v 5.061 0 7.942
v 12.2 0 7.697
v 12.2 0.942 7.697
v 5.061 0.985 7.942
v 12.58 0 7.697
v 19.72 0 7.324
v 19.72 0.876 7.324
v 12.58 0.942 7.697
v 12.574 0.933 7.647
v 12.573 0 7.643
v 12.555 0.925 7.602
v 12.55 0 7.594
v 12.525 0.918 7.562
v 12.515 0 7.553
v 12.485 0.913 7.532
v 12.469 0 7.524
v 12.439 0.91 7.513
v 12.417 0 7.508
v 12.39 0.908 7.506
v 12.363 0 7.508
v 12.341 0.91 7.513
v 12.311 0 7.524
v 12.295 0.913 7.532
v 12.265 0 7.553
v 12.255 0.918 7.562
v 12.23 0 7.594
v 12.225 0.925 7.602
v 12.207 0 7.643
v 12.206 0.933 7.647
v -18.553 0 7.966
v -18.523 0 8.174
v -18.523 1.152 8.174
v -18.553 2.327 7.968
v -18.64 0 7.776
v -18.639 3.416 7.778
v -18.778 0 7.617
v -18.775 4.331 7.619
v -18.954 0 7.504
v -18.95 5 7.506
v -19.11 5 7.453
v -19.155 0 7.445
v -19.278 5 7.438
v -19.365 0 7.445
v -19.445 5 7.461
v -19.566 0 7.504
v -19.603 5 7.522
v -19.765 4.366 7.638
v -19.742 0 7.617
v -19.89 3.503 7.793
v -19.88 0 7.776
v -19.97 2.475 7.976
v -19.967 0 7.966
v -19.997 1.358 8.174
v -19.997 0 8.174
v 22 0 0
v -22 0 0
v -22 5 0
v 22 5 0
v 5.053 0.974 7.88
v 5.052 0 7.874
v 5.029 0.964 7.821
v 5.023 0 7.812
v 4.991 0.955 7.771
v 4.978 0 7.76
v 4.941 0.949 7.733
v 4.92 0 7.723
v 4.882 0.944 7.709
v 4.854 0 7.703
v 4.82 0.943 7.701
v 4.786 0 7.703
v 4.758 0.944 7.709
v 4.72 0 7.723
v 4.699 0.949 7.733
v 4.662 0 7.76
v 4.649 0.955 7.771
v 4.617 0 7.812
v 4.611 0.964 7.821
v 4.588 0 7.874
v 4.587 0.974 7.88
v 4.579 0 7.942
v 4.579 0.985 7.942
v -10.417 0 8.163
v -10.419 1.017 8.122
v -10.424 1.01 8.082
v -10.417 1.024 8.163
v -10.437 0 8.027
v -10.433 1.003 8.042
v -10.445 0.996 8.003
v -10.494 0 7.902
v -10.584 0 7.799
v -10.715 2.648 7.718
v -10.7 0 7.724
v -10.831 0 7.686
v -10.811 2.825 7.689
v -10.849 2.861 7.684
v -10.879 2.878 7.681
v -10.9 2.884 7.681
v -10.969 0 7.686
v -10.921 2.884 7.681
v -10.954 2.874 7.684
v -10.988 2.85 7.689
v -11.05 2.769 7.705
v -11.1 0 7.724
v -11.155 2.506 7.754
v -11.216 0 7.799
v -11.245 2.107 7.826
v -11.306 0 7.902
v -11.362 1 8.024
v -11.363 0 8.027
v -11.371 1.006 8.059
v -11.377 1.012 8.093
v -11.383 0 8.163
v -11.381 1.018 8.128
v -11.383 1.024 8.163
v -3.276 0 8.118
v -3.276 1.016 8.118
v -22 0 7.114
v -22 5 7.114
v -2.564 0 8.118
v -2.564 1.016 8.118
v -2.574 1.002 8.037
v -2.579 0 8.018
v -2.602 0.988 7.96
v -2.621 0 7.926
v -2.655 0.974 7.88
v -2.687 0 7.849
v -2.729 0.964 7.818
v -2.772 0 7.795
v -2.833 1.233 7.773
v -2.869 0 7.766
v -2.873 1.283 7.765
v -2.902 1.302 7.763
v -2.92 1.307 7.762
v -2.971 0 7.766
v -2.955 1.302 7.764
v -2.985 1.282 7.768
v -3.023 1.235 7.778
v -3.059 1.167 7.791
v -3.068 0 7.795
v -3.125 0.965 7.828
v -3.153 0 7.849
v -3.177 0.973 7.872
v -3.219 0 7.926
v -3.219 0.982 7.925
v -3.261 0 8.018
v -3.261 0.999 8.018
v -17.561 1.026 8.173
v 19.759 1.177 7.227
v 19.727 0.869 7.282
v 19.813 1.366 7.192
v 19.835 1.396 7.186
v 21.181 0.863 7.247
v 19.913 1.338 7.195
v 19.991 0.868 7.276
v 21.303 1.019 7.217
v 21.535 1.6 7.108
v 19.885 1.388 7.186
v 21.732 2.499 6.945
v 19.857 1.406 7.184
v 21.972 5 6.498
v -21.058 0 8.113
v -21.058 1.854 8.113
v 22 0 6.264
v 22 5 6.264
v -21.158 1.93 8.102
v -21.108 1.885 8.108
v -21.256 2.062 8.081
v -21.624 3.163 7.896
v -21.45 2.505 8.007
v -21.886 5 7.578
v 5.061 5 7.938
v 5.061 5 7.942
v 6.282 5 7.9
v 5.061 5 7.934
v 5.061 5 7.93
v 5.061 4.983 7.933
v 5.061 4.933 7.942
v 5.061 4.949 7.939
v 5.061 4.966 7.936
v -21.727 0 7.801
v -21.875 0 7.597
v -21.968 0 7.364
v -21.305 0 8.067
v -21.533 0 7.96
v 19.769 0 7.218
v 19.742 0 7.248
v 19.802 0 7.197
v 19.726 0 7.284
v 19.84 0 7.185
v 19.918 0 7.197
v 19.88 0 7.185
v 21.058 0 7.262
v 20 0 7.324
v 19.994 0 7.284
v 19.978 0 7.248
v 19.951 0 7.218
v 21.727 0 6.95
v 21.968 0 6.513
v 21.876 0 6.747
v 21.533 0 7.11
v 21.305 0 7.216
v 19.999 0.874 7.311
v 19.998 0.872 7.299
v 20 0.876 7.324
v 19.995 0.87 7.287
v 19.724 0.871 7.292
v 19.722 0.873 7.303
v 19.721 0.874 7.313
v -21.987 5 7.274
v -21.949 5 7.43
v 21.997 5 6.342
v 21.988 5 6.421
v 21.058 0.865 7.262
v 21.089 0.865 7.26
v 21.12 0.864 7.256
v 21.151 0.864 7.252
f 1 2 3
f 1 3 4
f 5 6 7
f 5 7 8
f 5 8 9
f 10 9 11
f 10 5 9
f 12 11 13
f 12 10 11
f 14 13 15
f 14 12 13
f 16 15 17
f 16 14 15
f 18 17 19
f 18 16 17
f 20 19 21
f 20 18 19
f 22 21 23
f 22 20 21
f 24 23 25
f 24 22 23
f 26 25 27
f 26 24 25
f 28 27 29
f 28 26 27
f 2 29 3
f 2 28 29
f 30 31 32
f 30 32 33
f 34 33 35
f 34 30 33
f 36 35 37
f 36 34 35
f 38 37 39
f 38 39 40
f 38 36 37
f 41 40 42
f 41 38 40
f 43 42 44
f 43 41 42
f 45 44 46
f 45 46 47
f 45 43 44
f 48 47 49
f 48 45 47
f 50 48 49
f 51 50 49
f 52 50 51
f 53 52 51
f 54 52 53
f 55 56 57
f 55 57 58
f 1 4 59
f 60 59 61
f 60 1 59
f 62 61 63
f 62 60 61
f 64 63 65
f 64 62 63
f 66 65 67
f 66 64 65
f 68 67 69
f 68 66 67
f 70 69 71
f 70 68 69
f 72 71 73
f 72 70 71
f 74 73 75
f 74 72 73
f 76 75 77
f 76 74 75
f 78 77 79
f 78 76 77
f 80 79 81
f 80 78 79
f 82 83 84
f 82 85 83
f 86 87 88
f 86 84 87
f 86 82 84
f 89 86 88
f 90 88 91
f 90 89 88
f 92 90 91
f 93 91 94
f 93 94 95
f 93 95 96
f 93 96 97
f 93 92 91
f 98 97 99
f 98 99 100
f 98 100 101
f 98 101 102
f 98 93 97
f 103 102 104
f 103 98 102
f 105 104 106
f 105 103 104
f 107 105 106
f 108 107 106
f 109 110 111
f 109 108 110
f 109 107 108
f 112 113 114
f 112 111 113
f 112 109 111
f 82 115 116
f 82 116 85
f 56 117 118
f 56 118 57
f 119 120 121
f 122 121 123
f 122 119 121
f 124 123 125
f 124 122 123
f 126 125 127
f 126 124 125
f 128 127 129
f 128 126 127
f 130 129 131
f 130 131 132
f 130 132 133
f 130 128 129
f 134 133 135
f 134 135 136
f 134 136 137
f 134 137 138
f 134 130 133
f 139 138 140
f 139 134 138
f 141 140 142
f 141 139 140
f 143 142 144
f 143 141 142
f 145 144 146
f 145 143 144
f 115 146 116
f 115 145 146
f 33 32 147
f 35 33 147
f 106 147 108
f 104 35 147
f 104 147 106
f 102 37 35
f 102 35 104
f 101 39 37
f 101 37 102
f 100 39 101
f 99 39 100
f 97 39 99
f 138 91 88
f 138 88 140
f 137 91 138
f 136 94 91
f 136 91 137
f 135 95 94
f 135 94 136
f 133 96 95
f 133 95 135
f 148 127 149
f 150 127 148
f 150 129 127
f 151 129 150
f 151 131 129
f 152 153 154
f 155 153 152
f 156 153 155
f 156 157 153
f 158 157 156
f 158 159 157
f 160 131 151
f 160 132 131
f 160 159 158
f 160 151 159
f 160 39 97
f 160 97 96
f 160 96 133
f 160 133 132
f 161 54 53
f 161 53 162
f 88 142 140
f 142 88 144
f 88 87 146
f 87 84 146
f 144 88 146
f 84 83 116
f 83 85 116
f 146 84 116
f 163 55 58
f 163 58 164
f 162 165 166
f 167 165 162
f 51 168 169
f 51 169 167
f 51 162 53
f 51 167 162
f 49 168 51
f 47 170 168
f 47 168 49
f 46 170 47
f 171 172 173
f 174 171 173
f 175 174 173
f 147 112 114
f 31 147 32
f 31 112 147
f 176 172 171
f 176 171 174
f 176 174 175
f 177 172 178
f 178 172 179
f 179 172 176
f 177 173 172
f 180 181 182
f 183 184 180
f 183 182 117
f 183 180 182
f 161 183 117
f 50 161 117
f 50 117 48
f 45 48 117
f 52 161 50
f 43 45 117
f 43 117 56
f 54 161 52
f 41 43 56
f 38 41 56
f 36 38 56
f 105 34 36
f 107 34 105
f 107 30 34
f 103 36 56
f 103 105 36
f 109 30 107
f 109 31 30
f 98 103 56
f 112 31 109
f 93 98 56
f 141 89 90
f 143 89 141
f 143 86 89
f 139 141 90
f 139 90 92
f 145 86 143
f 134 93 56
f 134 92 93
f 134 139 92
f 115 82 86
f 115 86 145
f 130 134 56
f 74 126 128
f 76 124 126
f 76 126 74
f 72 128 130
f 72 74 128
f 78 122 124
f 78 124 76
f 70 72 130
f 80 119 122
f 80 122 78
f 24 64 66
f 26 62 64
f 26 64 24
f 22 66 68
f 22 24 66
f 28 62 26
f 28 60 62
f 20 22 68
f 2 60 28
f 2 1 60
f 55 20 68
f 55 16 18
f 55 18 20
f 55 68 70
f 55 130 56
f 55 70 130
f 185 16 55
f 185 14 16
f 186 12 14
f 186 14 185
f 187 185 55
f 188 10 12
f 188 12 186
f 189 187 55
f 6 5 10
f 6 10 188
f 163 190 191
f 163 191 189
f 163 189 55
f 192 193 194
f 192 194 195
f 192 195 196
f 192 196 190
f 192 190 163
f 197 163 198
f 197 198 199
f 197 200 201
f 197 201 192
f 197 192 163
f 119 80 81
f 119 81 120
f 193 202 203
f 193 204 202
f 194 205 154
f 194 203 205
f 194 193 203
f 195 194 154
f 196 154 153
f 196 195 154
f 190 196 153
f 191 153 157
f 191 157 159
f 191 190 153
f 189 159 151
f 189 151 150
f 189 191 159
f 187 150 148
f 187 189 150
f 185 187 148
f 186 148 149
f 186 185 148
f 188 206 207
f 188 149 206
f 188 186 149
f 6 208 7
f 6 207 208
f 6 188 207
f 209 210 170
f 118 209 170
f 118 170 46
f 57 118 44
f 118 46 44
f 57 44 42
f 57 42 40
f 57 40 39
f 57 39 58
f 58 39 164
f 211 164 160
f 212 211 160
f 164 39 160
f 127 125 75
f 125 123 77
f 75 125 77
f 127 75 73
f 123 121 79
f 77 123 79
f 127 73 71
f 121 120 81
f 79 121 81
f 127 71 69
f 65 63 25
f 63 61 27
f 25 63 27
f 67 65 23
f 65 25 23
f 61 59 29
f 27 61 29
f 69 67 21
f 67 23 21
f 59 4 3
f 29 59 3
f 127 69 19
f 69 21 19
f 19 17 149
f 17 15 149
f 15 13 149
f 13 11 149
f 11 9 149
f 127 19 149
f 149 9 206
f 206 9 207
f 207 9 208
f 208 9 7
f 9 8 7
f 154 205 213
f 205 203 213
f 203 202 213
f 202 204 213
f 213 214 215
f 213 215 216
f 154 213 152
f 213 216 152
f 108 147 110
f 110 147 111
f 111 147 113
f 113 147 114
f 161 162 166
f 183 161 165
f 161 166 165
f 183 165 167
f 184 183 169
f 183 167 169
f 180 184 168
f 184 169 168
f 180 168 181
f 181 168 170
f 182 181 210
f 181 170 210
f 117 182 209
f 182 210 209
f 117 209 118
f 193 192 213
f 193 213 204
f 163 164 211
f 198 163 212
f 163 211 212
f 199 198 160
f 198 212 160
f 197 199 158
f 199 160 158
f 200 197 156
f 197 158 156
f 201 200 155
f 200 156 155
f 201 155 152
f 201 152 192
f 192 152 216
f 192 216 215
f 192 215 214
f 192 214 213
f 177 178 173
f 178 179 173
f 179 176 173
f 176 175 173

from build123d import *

# Parameters (mm, degrees)
F1_DEPTH = 5
F2_R     = 1
F4_W     = 64.1363480276
F4_H     = 8
F5_DEPTH = 1


with BuildPart() as f1:
    # F0 (on Front) → F1 (new body)
    with BuildSketch(Plane.XZ):
        with BuildLine():
            Line((-22, 0), (0, 0))
            Line((0, 0), (22, 0))
            Line((22, 0), (22, 7.2071))
            Line((22, 7.2071), (19.9997, 7.3237253161))
            ThreePointArc((19.9997, 7.3237253161), (19.86, 7.1840253161), (19.7203, 7.3237253161))
            Line((19.7203, 7.3237253161), (12.5805, 7.6967855868))
            ThreePointArc((12.5805, 7.6967855868), (12.39, 7.5062855868), (12.1995, 7.6967855868))
            Line((12.1995, 7.6967855868), (5.0613, 7.9420773015))
            ThreePointArc((5.0613, 7.9420773015), (4.82, 7.7007773015), (4.5787, 7.9420773015))
            Line((4.5787, 7.9420773015), (-2.5644, 8.117998201))
            ThreePointArc((-2.5644, 8.117998201), (-2.92, 7.762398201), (-3.2756, 8.117998201))
            Line((-3.2756, 8.117998201), (-10.4174, 8.1633853138))
            ThreePointArc((-10.4174, 8.1633853138), (-10.9, 7.6807853138), (-11.3826, 8.1633853138))
            Line((-11.3826, 8.1633853138), (-18.5234, 8.173969372))
            ThreePointArc((-18.5234, 8.173969372), (-19.26, 7.437369372), (-19.9966, 8.173969372))
            Line((-19.9966, 8.173969372), (-22, 8.0581))
            Line((-22, 8.0581), (-22, 0))
        make_face()
    extrude(amount=-F1_DEPTH)

    # F2
    f2_edges = [f1.edges().sort_by_distance(p)[0] for p in [
        (22, 2.5, 7.2071),
        (-22, 2.5, 8.0581),
    ]]
    fillet(f2_edges, radius=F2_R)

    # F4 (on face) → F5 (cut)
    with BuildSketch(Plane(origin=(0.2133288598, 1.5278099899, 8.6620144765), x_dir=(0.9997060085, -0.0042116127, -0.023878002), z_dir=(0.0242465804, 0.1736481777, 0.9845092248))):
        with Locations((5.2079893117, 3.5908480534)):
            Rectangle(F4_W, F4_H)
    extrude(amount=-F5_DEPTH, mode=Mode.SUBTRACT)


solid = f1.part
